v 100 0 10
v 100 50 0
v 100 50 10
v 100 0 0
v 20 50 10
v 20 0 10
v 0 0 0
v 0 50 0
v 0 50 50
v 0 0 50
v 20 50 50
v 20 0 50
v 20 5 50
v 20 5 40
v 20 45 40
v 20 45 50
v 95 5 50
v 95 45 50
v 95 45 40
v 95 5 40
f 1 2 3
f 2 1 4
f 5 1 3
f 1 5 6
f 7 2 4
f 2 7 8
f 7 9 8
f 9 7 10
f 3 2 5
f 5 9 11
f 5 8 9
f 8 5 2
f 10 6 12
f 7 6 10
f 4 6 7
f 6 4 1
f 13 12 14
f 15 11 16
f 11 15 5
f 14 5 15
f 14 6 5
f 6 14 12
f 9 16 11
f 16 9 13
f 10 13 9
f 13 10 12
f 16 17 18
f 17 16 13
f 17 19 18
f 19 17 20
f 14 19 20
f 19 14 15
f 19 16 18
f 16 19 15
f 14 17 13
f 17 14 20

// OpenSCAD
// simple l bar for support testing
//
//   ^        |----w2-----| -
//   |    -    ************ |
//   |    |    ************ h2
//   |    h1   ****         -
//   |    |    ****
//   |    -    ****
//   |        |-w1-|
//   z
//    x ---------------------------->
//
// depth is how far the model goes in y

h1 = 50;
h2 = 10;
w1 = 20;
w2 = 100;
depth = 50;

cube([ w2, depth, h2 ], false);
cube([ w1, depth, h1 ], false);
translate([ 5, 5, h1 - h2 ]) { cube([ w2 - 10, depth-10, h2 ], false); }
